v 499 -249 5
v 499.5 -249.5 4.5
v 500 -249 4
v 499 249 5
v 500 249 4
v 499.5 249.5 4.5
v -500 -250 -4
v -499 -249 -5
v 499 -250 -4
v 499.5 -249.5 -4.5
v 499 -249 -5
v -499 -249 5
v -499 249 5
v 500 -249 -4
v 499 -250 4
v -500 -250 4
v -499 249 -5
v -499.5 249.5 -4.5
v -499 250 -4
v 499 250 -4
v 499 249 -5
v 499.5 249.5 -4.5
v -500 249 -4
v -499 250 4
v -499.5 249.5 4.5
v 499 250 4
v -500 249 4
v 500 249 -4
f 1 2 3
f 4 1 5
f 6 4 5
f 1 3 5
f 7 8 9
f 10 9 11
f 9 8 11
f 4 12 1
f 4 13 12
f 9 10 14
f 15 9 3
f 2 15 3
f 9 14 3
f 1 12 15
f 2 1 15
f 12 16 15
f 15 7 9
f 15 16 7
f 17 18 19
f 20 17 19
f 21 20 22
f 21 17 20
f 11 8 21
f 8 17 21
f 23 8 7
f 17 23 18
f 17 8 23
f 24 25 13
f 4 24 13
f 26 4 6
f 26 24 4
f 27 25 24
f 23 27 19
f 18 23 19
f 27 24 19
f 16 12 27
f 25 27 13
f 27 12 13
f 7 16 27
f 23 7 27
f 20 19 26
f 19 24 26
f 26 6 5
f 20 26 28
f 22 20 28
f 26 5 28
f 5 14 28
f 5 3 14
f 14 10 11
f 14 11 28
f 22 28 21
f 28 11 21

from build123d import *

# Parameters (mm, degrees)
F0_W     = 1000
F0_H     = 500
F1_DEPTH = 5
F2_SIZE  = 1
F3_SIZE  = 1
F4_SIZE  = 1
F5_SIZE  = 1
F6_SIZE  = 1
F7_SIZE  = 1
F8_SIZE  = 1


with BuildPart() as f1:
    # F0 (on Top) → F1 (new body, symmetric)
    with BuildSketch(Plane.XY):
        Rectangle(F0_W, F0_H)
    extrude(amount=F1_DEPTH, both=True)

    # F2
    f2_edges = [f1.edges().sort_by_distance(p)[0] for p in [
        (0, 250, 5),
    ]]
    chamfer(f2_edges, length=F2_SIZE)

    # F3
    f3_edges = [f1.edges().sort_by_distance(p)[0] for p in [
        (500, -0.5, 5),
    ]]
    chamfer(f3_edges, length=F3_SIZE)

    # F4
    f4_edges = [f1.edges().sort_by_distance(p)[0] for p in [
        (500, 0, -5),
    ]]
    chamfer(f4_edges, length=F4_SIZE)

    # F5
    f5_edges = [f1.edges().sort_by_distance(p)[0] for p in [
        (500, 250, 0),
    ]]
    chamfer(f5_edges, length=F5_SIZE)

    # F6
    f6_edges = [f1.edges().sort_by_distance(p)[0] for p in [
        (-0.5, 250, -5),
    ]]
    chamfer(f6_edges, length=F6_SIZE)

    # F7 (call 1 of 3: OpenCascade refuses the feature's edges together)
    f7_edges = [f1.edges().sort_by_distance(p)[0] for p in [
        (-0.5, -250, 5),
    ]]
    chamfer(f7_edges, length=F7_SIZE)

    # F7#2 (call 2 of 3)
    f7_2_edges = [f1.edges().sort_by_distance(p)[0] for p in [
        (-0.5, -250, -5),
    ]]
    chamfer(f7_2_edges, length=F7_SIZE)

    # F7#3 (call 3 of 3)
    f7_3_edges = [f1.edges().sort_by_distance(p)[0] for p in [
        (500, -250, 0),
    ]]
    chamfer(f7_3_edges, length=F7_SIZE)

    # F8 (call 1 of 3: OpenCascade refuses the feature's edges together)
    f8_edges = [f1.edges().sort_by_distance(p)[0] for p in [
        (-500, 250, 0),
    ]]
    chamfer(f8_edges, length=F8_SIZE)

    # F8#2 (call 2 of 3)
    f8_2_edges = [f1.edges().sort_by_distance(p)[0] for p in [
        (-500, 0, 5),
    ]]
    chamfer(f8_2_edges, length=F8_SIZE)

    # F8#3 (call 3 of 3)
    f8_3_edges = [f1.edges().sort_by_distance(p)[0] for p in [
        (-500, 0, -5),
    ]]
    chamfer(f8_3_edges, length=F8_SIZE)


solid = f1.part
